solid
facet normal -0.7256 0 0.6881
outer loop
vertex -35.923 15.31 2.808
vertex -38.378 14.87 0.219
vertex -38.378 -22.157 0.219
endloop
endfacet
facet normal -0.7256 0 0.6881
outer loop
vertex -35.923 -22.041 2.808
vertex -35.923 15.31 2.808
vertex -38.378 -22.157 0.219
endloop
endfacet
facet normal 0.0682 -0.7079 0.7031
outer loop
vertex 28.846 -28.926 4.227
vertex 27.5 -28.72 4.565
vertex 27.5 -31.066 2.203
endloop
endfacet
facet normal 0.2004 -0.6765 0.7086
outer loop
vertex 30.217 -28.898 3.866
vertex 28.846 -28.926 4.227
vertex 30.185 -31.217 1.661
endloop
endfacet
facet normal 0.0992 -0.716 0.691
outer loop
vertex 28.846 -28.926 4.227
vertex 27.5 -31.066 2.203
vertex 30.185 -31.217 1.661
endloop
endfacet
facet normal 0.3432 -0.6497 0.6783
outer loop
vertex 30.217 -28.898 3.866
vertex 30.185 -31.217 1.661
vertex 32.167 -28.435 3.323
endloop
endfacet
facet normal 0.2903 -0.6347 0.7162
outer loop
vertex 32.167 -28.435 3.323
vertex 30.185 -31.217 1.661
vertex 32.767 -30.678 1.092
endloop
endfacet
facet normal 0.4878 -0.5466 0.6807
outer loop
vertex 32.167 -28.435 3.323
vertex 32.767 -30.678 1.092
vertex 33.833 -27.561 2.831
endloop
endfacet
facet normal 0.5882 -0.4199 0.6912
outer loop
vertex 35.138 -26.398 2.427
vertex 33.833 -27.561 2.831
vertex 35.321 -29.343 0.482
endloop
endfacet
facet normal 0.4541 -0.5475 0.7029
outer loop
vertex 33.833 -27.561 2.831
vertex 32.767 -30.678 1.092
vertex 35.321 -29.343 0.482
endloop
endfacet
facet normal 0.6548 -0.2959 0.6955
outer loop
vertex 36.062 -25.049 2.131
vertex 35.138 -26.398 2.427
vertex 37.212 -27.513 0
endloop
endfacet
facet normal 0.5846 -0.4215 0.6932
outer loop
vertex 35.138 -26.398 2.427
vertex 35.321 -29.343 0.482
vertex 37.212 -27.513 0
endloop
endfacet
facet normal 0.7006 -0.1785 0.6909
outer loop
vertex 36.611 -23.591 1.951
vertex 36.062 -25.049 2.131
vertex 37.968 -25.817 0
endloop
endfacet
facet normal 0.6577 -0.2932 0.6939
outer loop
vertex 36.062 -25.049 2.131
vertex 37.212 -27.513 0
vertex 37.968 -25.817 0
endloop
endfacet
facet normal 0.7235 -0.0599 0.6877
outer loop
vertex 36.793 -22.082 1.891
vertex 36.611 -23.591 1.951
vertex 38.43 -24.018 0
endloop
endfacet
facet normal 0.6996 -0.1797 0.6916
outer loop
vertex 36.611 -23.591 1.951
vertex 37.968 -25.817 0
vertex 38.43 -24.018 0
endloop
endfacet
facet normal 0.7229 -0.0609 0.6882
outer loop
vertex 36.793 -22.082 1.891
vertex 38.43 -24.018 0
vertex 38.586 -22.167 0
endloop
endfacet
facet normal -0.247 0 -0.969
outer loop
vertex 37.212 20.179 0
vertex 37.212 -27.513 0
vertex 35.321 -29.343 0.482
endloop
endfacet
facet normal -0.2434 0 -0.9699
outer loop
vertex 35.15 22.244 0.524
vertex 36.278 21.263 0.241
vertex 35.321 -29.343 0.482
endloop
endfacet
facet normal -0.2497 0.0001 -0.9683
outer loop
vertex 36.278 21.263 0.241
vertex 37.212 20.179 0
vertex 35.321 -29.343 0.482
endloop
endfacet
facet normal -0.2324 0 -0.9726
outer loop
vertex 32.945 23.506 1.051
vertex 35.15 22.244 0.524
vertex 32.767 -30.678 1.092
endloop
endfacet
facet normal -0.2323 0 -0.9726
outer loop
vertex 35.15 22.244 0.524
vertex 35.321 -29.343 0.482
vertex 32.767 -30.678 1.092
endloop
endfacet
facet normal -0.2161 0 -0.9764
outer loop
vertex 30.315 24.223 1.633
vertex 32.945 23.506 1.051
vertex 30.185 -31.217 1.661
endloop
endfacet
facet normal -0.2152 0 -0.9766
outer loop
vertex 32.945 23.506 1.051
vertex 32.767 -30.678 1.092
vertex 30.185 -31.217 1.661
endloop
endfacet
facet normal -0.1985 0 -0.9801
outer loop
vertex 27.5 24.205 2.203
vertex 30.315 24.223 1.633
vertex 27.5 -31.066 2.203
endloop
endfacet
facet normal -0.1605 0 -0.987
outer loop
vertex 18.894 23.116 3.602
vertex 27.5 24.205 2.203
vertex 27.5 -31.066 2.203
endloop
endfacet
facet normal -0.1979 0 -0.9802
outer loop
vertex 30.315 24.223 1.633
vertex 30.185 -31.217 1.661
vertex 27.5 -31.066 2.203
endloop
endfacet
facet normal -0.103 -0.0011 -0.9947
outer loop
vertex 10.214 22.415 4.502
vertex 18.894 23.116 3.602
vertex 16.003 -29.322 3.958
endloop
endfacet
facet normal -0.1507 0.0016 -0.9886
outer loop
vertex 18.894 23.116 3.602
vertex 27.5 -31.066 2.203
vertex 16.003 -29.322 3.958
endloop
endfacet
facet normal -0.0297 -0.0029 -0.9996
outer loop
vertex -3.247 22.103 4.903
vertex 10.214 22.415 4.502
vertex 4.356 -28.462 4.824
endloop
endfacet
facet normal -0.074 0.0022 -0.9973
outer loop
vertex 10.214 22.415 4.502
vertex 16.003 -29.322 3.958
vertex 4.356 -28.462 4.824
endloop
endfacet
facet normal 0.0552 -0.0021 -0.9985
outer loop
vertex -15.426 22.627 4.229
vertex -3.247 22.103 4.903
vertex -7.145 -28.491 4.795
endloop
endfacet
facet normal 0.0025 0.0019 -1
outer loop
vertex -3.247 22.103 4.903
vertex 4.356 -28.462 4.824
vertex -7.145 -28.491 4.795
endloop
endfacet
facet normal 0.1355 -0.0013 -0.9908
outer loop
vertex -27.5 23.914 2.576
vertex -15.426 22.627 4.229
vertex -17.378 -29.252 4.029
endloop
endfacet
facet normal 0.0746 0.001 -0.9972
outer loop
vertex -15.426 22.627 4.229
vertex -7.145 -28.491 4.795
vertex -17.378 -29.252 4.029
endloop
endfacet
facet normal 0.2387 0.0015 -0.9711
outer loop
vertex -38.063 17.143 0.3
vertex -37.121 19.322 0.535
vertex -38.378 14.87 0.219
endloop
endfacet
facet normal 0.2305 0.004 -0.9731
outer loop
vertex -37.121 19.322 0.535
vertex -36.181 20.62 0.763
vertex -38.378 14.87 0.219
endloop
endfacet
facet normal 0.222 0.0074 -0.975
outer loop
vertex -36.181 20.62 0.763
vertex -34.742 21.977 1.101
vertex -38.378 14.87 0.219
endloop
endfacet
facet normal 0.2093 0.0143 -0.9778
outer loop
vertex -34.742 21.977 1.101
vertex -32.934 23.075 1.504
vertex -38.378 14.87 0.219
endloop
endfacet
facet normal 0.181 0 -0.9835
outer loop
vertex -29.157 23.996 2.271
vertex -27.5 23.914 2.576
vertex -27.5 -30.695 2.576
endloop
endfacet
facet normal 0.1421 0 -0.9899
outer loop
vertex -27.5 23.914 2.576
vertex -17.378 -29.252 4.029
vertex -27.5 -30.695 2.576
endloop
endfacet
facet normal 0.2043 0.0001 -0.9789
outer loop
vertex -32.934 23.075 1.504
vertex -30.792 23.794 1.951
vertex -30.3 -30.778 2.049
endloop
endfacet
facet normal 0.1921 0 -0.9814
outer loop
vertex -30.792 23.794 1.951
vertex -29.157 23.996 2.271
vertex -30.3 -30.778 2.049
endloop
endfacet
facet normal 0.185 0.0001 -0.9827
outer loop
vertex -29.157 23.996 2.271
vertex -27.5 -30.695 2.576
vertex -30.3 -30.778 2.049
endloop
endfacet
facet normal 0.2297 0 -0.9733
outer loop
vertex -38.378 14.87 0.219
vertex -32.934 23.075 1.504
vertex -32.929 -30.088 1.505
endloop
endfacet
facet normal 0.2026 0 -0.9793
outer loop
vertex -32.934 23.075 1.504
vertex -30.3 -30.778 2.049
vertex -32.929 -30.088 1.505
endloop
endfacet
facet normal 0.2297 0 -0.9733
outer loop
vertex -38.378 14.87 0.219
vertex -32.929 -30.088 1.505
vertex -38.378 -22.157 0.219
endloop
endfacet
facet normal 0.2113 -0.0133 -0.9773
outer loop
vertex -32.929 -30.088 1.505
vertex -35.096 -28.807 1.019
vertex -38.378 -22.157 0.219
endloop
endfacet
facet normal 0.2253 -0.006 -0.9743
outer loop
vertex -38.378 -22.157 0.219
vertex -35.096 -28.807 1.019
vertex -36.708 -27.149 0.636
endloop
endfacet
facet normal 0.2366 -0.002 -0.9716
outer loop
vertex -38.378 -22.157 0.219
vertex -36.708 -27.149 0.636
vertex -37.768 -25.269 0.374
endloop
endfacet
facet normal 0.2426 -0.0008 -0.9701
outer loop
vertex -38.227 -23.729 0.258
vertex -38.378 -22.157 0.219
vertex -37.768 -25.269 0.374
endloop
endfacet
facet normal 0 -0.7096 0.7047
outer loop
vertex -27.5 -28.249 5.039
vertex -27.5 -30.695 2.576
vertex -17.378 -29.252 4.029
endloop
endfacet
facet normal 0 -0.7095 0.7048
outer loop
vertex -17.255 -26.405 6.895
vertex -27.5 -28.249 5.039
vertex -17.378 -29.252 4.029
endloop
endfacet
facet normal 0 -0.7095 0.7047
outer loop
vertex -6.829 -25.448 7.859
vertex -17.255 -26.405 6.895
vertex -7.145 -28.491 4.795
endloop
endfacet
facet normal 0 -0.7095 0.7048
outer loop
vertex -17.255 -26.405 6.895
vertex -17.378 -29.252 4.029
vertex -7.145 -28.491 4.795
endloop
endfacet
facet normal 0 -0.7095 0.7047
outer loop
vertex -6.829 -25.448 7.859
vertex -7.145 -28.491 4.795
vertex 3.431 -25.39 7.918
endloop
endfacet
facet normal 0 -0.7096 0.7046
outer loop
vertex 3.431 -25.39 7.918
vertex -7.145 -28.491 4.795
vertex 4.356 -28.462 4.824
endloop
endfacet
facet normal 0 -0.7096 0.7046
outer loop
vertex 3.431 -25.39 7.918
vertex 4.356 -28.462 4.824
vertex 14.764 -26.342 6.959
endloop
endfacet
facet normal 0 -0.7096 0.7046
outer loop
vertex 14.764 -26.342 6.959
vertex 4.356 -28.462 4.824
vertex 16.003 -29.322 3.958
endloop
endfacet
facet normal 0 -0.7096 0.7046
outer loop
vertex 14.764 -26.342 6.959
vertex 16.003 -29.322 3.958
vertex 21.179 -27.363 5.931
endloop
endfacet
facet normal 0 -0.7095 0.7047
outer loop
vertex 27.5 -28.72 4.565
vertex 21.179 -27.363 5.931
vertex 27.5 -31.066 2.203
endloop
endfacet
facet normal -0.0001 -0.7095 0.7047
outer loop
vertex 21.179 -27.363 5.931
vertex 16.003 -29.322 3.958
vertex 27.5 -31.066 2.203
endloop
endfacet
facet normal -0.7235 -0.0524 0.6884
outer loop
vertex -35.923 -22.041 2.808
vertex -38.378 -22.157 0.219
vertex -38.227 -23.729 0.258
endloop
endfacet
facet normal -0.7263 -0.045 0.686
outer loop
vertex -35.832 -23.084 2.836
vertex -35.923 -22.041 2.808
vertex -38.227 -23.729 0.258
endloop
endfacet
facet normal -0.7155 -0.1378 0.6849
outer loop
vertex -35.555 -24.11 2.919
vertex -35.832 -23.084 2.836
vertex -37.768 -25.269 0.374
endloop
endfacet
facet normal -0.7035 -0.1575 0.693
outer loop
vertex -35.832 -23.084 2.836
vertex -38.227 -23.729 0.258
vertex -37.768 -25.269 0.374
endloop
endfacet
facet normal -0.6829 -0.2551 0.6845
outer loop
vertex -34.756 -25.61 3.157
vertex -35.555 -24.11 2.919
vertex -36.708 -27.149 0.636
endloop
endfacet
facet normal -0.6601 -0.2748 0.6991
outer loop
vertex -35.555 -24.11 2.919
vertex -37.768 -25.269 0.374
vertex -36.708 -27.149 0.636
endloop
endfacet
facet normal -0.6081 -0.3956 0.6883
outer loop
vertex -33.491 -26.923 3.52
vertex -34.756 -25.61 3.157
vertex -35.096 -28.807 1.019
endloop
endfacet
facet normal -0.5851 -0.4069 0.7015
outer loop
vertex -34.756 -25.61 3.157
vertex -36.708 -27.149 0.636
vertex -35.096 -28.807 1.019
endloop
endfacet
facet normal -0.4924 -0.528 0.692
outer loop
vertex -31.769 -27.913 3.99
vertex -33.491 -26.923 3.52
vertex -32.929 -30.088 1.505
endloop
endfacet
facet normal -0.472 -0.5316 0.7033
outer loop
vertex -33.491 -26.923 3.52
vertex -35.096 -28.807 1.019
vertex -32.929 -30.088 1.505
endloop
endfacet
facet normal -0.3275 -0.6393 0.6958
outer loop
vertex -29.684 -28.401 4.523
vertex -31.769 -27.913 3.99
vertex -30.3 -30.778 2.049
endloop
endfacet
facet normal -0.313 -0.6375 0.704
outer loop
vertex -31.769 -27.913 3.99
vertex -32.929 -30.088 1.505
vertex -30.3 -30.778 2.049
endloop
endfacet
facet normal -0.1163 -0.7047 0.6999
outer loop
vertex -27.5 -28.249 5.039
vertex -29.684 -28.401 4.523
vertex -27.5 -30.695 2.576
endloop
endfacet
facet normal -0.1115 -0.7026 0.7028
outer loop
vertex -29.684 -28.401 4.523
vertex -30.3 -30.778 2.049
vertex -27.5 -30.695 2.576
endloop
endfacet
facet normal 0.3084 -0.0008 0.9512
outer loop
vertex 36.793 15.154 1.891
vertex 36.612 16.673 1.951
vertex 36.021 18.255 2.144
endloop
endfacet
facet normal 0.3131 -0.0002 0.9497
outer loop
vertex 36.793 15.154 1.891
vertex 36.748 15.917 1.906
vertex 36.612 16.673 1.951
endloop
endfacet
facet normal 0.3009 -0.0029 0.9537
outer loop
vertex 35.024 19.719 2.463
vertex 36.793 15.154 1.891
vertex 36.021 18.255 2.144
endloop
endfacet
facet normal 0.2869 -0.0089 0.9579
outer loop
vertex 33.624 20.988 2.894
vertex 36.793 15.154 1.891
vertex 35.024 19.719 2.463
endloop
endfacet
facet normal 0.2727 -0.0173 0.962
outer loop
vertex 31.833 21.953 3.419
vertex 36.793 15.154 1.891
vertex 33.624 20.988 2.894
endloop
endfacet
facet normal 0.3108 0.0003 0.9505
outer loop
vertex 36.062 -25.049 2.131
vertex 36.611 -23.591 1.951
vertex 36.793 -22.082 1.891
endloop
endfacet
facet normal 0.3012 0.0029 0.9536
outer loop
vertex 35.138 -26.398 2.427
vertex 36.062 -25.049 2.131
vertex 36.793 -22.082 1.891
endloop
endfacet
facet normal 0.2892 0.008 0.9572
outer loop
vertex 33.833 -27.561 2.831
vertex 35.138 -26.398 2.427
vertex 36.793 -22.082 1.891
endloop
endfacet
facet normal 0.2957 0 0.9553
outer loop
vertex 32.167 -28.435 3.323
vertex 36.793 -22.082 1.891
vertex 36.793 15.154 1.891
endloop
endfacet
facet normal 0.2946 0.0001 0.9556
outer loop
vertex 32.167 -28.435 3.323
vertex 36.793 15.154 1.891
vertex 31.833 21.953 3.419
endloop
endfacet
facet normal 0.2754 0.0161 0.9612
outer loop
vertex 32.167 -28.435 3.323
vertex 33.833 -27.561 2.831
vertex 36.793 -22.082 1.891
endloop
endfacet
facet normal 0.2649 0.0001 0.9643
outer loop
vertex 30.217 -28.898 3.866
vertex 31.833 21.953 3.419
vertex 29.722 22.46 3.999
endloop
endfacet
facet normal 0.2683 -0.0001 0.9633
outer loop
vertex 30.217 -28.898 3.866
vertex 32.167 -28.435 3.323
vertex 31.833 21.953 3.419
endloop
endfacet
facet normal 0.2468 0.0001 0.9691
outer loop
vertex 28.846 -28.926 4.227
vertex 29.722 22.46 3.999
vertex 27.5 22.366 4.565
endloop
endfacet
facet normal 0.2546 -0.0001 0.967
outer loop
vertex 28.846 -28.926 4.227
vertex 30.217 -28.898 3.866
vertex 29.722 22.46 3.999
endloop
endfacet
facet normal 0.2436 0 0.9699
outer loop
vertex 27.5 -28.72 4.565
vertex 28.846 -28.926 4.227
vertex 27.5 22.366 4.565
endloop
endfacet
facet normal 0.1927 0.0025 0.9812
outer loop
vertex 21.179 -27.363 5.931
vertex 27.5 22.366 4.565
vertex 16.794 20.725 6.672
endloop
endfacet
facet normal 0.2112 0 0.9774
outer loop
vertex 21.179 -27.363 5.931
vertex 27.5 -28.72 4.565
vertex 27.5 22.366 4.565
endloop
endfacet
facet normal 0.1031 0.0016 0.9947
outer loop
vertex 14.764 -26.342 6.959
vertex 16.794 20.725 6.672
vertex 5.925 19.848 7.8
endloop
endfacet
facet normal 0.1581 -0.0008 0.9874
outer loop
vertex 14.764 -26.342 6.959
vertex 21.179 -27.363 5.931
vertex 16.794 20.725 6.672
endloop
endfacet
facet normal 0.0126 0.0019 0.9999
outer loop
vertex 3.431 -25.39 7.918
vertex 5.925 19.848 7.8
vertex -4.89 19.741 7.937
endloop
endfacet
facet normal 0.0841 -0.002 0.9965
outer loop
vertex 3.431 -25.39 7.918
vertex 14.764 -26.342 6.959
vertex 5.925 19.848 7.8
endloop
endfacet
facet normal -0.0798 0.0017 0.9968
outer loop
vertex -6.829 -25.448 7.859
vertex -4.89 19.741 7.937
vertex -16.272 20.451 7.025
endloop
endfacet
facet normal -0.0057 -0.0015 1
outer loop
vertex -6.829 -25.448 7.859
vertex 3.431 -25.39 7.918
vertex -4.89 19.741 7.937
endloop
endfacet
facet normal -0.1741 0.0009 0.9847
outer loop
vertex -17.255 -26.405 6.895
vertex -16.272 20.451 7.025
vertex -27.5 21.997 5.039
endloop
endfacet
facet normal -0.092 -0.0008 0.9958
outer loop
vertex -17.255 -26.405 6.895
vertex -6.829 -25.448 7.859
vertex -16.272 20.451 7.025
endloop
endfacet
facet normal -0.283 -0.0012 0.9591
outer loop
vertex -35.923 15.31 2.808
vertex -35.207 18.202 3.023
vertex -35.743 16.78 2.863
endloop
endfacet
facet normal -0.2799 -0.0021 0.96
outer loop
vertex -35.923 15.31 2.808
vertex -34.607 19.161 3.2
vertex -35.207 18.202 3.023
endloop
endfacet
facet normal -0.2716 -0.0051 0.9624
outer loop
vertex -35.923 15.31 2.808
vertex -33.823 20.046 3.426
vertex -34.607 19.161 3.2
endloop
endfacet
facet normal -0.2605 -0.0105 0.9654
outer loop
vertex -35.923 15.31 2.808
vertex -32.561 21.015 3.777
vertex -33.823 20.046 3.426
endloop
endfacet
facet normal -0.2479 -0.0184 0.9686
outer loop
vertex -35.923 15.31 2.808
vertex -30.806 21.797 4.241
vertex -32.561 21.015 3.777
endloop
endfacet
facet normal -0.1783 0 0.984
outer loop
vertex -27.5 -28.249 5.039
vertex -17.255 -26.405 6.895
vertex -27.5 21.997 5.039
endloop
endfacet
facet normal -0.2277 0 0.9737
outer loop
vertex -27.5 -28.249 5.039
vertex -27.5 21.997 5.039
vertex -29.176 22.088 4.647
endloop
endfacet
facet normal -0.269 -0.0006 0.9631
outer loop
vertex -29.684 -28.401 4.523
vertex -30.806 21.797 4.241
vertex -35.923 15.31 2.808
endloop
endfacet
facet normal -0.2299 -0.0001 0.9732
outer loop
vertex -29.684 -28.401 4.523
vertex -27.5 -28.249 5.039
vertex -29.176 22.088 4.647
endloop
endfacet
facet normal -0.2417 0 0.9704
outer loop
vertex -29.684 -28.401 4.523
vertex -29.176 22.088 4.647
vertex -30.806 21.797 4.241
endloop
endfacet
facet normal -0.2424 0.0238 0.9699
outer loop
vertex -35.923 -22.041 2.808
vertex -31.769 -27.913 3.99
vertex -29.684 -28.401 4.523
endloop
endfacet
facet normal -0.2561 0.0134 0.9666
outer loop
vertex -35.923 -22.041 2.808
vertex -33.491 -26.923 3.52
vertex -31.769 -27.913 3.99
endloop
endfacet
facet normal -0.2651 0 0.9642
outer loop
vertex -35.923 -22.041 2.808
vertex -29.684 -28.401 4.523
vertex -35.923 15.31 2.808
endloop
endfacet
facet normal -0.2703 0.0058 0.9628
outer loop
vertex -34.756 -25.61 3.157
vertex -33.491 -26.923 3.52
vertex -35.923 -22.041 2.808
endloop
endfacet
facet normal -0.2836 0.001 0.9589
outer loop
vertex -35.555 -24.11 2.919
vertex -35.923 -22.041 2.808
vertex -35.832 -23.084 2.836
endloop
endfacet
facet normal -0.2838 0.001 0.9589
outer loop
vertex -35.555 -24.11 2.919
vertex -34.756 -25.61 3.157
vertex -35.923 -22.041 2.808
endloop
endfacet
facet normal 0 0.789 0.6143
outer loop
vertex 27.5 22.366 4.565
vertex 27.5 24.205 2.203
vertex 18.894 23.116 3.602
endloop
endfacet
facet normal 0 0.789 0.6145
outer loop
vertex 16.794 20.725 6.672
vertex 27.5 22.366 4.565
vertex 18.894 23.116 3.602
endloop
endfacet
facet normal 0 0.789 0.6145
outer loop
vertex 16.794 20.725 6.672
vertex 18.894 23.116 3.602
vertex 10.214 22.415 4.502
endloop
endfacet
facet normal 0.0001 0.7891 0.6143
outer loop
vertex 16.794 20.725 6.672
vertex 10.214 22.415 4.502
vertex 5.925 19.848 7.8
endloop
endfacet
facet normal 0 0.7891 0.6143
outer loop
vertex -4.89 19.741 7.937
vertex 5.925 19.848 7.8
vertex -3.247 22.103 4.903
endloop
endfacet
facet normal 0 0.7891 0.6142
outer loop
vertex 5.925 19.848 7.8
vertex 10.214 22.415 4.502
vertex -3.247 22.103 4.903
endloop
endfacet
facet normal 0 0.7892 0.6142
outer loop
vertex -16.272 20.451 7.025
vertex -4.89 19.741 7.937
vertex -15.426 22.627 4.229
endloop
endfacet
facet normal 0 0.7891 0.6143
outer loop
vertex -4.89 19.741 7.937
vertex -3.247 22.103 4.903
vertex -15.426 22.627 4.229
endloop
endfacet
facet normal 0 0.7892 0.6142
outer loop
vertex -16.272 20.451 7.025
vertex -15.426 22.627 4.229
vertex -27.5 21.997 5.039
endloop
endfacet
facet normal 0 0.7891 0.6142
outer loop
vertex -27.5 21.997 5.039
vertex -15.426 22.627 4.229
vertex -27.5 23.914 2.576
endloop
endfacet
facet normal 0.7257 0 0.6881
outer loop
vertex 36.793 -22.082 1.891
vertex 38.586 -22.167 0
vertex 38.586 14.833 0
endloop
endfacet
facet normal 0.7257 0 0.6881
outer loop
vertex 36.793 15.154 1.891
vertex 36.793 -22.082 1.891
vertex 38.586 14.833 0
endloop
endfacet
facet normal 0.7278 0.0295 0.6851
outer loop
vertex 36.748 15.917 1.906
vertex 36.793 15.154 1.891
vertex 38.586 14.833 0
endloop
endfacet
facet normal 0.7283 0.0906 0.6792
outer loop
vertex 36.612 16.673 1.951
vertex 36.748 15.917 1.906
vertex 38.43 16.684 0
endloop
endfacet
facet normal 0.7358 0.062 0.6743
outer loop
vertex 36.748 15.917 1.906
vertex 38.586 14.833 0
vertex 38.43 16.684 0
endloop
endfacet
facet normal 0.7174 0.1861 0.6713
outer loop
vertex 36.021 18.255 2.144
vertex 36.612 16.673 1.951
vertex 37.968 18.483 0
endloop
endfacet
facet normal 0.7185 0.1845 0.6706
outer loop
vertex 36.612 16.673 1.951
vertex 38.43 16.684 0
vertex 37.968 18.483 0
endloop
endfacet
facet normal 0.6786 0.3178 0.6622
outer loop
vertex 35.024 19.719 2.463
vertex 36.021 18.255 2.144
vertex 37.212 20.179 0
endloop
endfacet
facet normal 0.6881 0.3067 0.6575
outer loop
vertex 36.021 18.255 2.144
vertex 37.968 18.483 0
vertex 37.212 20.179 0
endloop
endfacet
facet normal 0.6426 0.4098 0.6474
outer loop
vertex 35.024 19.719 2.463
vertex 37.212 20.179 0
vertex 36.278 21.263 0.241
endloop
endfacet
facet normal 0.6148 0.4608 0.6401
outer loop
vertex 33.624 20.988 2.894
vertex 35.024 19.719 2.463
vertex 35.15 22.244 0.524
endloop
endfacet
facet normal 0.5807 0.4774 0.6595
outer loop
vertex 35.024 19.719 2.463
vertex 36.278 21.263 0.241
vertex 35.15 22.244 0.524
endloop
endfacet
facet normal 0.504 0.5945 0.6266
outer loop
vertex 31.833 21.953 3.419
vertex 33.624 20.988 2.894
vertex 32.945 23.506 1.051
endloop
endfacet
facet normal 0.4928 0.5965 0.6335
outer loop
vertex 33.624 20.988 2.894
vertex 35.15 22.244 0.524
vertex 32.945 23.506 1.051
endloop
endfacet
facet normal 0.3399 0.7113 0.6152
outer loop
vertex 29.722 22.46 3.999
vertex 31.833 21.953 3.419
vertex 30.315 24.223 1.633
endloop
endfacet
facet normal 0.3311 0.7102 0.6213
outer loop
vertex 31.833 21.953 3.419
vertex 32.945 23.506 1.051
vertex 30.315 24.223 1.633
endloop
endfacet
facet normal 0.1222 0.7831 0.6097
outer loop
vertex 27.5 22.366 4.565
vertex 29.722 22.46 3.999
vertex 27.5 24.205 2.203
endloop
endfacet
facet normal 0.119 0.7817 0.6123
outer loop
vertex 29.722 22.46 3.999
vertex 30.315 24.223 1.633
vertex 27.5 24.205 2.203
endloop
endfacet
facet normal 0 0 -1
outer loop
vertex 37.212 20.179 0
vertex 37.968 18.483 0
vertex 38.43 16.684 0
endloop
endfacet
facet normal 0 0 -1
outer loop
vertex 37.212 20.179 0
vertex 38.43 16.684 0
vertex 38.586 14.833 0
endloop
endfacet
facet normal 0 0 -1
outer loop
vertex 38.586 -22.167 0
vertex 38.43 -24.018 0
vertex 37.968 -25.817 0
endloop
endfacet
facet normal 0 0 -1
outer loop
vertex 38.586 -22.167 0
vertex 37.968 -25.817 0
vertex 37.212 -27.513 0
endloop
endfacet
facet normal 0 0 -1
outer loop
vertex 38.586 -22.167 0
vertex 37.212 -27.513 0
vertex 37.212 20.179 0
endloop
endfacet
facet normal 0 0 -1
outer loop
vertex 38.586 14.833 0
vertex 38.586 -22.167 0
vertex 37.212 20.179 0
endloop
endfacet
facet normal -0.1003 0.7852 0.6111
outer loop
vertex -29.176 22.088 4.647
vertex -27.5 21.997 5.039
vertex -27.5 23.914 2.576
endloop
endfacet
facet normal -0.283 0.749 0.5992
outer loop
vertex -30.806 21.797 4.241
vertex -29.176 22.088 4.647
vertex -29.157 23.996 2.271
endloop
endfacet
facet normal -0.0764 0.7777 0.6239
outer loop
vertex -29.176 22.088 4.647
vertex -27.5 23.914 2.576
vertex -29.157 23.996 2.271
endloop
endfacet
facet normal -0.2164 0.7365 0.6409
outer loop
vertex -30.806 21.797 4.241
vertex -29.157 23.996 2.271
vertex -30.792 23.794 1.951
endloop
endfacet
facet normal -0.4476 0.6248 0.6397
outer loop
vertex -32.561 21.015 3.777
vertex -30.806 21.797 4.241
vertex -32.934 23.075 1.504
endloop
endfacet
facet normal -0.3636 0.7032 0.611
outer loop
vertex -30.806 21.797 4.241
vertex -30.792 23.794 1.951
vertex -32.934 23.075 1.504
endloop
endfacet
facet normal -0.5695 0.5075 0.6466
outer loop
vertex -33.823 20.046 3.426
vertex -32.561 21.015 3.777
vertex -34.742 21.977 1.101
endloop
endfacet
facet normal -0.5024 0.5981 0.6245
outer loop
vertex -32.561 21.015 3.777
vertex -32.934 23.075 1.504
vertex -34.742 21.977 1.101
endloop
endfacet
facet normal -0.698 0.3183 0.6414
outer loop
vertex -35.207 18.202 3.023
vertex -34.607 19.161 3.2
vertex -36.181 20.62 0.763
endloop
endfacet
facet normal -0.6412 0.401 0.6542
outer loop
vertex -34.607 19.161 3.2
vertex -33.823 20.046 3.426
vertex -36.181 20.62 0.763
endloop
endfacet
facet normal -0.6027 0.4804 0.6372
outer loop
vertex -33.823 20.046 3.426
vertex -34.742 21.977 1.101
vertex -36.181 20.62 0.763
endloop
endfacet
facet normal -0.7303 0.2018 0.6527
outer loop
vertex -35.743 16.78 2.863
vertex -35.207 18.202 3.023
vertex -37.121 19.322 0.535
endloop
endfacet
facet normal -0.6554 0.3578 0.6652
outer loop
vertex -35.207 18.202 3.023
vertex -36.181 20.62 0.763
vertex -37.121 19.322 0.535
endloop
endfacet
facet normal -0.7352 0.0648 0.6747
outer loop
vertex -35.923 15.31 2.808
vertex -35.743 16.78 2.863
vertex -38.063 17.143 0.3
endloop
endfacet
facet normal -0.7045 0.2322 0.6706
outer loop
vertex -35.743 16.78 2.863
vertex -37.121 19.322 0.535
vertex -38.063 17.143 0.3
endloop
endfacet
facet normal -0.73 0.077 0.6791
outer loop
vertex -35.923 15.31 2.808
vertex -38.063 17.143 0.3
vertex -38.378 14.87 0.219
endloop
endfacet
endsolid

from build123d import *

# Parameters (mm, degrees)
SKETCH003_R  = 120
PAD001_DEPTH = 35
SKETCH002_R  = 150.91951
PAD_DEPTH    = 35


with BuildPart() as pad001:
    # Sketch003 → Pad001 (new body, symmetric)
    with BuildSketch(Plane.XZ):
        with Locations((-1.007223, -112)):
            Circle(SKETCH003_R)
    extrude(amount=PAD001_DEPTH, both=True)


with BuildPart() as pad:
    # Sketch002 → Pad (new body, symmetric)
    with BuildSketch(Plane.XZ):
        with Locations((-1.007223, -146)):
            Circle(SKETCH002_R)
    extrude(amount=PAD_DEPTH, both=True)


with BuildPart() as common:
    # Sketch001 → Loft section 0
    with BuildSketch(Plane.XY.offset(8)):
        with BuildLine():
            Line((-31.000014, 16.191998), (-31.000014, -21.808002))
            ThreePointArc((-31.000014, -21.808002), (-29.974879, -24.282877), (-27.500001, -25.308002))
            Line((-27.500001, -25.308002), (27.499999, -25.308002))
            ThreePointArc((27.499999, -25.308002), (29.974879, -24.282877), (31.000014, -21.808002))
            Line((31.000014, -21.808002), (31.000014, 16.191998))
            ThreePointArc((31.000014, 16.191998), (29.974879, 18.666873), (27.499999, 19.691998))
            Line((27.499999, 19.691998), (-27.500001, 19.691998))
            ThreePointArc((-27.500001, 19.691998), (-29.974879, 18.666873), (-31.000014, 16.191998))
        make_face()
    # Sketch → Loft section 1
    with BuildSketch(Plane.XY):
        with BuildLine():
            Line((-38.586045, 14.832981), (-38.586045, -22.167019))
            ThreePointArc((-38.586045, -22.167019), (-35.339018, -30.006036), (-27.5, -33.253064))
            Line((-27.5, -33.253064), (27.5, -33.253064))
            ThreePointArc((27.5, -33.253064), (35.339018, -30.006036), (38.586045, -22.167019))
            Line((38.586045, -22.167019), (38.586045, 14.832981))
            ThreePointArc((38.586045, 14.832981), (35.339018, 22.671999), (27.5, 25.919026))
            Line((27.5, 25.919026), (-27.5, 25.919026))
            ThreePointArc((-27.5, 25.919026), (-35.339018, 22.671999), (-38.586045, 14.832981))
        make_face()
    loft()

    # Cut: cut Pad
    add(pad.part, mode=Mode.SUBTRACT)

    # Common: intersect Pad001
    add(pad001.part, mode=Mode.INTERSECT)


solid = common.part
